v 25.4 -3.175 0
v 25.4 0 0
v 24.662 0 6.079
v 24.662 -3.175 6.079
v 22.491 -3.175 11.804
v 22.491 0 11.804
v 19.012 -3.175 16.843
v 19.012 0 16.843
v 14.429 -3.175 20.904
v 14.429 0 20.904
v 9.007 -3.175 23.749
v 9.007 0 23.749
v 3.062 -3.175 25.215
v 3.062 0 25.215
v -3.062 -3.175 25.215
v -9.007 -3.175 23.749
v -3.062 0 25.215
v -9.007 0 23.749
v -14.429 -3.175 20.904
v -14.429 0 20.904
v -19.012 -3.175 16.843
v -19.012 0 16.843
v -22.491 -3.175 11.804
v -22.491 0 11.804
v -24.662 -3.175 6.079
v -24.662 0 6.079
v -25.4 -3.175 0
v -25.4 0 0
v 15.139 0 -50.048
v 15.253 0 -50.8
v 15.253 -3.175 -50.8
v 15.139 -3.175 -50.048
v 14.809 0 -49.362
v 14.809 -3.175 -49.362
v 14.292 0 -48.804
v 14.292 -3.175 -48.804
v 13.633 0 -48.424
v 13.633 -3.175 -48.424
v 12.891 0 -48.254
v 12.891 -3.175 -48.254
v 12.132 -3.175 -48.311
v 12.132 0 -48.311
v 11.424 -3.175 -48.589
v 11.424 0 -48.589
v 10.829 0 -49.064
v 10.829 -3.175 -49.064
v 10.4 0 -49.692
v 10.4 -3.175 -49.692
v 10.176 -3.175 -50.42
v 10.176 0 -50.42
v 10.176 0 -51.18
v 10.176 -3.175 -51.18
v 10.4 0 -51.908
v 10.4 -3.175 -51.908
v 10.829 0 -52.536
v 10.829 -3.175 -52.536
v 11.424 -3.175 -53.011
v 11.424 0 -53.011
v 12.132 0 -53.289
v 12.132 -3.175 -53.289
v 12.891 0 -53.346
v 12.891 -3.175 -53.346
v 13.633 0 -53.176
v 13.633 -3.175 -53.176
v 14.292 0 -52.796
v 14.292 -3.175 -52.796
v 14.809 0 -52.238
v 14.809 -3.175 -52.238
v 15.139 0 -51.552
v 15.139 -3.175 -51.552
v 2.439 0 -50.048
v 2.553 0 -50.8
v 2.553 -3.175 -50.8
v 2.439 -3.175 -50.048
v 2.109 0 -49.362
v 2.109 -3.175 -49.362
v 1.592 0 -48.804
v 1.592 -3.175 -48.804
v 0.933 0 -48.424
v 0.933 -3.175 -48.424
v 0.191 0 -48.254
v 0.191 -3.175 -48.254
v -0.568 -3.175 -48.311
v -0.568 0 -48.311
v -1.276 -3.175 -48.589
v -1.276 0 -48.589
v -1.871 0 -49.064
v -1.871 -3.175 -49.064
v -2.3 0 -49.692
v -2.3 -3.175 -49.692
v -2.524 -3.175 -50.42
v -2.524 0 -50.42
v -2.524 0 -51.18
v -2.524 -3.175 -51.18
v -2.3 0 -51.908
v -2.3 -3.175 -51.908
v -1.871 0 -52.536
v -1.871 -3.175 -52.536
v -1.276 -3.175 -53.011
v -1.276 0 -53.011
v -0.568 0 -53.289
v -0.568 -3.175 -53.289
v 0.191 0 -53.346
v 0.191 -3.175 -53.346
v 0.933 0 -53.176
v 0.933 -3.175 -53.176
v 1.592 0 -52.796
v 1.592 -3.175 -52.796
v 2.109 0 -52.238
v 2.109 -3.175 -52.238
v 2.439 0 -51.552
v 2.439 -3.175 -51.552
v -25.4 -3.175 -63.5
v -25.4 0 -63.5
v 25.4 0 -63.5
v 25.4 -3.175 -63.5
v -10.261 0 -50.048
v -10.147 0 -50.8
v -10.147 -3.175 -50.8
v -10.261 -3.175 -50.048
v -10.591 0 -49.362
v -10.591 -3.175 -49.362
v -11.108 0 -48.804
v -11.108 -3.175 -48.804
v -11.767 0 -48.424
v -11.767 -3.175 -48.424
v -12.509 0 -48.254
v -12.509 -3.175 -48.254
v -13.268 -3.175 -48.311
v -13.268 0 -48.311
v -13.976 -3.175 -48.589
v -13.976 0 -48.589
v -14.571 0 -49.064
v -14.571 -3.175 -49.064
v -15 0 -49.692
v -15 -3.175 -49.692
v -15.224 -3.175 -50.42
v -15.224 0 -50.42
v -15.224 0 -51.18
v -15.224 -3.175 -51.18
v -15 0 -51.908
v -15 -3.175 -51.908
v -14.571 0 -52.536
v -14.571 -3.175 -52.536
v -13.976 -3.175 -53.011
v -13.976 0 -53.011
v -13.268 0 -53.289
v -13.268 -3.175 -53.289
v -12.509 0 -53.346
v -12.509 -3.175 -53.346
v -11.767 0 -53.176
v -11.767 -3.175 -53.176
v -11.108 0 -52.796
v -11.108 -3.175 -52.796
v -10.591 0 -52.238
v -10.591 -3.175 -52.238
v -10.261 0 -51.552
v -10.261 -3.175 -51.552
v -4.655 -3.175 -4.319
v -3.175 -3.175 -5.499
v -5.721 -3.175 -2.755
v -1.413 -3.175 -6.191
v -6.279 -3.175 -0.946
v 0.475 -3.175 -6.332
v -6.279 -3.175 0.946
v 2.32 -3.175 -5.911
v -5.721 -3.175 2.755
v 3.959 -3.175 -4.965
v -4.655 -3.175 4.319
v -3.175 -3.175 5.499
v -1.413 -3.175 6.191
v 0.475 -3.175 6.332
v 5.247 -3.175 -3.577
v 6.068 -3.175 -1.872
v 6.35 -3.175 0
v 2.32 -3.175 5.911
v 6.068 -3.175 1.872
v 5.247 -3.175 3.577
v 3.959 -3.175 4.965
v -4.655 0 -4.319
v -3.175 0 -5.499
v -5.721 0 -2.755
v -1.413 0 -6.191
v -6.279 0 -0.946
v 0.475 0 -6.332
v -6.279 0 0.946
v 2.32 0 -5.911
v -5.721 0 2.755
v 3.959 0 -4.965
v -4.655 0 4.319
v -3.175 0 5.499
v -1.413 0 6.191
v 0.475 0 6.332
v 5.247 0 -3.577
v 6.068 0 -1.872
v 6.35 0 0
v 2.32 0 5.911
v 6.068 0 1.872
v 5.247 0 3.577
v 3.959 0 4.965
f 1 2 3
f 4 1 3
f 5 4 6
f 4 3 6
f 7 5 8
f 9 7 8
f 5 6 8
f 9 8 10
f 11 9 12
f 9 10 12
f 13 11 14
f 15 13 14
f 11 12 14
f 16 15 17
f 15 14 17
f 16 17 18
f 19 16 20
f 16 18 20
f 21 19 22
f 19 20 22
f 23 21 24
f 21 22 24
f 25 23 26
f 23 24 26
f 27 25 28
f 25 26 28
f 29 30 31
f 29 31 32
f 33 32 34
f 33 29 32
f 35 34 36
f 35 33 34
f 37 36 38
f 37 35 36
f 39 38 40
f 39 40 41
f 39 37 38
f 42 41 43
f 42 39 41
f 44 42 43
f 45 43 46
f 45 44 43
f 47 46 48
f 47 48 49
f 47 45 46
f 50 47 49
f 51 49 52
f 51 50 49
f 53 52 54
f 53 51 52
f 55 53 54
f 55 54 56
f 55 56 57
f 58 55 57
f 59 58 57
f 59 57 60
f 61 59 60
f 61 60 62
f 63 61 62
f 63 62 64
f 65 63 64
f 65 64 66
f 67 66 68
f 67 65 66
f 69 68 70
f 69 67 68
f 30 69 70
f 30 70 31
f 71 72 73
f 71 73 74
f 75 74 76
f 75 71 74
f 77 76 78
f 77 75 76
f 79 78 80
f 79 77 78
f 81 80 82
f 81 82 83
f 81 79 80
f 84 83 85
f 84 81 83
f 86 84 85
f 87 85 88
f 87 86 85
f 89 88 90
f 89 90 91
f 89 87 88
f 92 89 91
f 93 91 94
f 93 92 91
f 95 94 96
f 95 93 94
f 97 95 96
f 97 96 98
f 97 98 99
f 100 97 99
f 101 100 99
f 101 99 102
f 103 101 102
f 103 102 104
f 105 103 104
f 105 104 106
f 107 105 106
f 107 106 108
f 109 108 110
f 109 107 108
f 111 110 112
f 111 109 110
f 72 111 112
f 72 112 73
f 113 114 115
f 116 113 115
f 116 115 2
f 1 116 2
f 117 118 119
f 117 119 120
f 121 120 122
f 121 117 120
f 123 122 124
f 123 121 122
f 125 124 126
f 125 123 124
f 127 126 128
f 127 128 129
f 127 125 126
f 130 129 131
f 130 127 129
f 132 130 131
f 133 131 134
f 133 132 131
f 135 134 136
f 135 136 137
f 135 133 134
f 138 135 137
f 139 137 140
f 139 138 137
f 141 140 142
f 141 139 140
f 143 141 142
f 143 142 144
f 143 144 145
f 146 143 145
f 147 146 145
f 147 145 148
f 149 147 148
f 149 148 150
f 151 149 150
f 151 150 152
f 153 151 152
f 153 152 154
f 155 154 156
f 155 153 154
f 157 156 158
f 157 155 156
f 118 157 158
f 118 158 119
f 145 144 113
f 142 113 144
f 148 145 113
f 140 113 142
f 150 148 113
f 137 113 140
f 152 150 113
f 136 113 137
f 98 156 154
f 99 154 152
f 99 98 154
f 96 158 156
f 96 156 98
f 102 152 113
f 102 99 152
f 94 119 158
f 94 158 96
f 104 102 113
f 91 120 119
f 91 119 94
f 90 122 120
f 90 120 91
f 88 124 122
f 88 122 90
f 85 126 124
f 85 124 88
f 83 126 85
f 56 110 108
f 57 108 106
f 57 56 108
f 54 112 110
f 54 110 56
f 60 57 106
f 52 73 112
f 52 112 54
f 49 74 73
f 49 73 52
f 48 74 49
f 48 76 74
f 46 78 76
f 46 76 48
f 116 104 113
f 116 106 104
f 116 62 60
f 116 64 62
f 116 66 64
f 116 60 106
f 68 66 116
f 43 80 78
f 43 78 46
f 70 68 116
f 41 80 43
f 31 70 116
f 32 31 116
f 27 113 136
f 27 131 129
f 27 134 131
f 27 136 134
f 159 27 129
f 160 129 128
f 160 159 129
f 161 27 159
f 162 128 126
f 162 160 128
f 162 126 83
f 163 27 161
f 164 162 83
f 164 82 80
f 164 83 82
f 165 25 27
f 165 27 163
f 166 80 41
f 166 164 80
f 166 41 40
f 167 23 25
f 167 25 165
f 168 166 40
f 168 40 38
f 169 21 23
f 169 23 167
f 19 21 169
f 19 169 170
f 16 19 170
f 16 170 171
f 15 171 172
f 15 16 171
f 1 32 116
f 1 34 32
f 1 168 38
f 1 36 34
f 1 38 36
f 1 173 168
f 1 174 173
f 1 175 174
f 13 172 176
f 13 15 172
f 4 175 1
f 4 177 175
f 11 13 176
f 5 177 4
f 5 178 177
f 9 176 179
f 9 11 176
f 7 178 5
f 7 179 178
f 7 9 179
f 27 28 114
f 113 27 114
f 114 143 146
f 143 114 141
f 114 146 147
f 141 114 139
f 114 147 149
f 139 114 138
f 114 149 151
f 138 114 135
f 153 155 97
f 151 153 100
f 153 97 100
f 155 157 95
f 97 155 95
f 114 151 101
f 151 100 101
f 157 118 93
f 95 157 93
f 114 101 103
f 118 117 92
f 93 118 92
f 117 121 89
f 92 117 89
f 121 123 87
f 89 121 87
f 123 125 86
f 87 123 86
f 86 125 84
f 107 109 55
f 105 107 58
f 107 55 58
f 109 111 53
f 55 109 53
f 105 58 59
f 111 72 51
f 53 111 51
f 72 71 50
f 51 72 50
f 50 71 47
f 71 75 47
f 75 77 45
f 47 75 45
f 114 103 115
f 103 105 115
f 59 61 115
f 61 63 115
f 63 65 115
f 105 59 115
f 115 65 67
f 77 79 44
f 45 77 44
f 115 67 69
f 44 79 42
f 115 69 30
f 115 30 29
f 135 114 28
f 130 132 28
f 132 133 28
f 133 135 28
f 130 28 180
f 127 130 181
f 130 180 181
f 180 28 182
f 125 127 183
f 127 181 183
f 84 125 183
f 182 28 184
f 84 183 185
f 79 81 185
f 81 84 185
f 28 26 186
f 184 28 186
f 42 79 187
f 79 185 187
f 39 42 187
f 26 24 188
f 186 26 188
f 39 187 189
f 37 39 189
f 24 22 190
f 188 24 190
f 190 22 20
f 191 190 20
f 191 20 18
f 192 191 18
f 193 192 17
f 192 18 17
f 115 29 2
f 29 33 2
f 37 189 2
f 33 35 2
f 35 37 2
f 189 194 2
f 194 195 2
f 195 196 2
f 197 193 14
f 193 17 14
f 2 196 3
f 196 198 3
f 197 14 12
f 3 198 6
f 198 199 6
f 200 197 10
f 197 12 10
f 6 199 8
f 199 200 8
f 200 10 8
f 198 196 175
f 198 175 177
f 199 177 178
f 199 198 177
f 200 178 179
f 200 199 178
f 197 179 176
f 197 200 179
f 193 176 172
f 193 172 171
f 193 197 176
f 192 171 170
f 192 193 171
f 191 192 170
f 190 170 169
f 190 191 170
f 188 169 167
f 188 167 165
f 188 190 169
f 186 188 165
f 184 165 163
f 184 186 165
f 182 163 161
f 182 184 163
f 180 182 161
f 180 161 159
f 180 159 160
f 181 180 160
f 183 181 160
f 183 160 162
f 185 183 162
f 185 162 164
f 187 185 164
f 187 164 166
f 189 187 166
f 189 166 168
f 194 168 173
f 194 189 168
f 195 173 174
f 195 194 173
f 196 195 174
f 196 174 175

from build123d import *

# Parameters (mm, degrees)
F0_R     = 2.5527
F0_R_2   = 6.35
F1_DEPTH = 3.175


with BuildPart() as f1:
    # F0 (on Front) → F1 (new body)
    with BuildSketch(Plane.XZ):
        with BuildLine():
            Line((25.4, -63.5), (25.4, 0))
            ThreePointArc((25.4, 0), (0, 25.4), (-25.4, 0))
            Line((-25.4, 0), (-25.4, -63.5))
            Line((-25.4, -63.5), (25.4, -63.5))
        make_face()
        with Locations((-12.7, -50.8)):
            Circle(F0_R, mode=Mode.SUBTRACT)
        with Locations((0, -50.8)):
            Circle(F0_R, mode=Mode.SUBTRACT)
        with Locations((12.7, -50.8)):
            Circle(F0_R, mode=Mode.SUBTRACT)
        Circle(F0_R_2, mode=Mode.SUBTRACT)
    extrude(amount=F1_DEPTH)


solid = f1.part
